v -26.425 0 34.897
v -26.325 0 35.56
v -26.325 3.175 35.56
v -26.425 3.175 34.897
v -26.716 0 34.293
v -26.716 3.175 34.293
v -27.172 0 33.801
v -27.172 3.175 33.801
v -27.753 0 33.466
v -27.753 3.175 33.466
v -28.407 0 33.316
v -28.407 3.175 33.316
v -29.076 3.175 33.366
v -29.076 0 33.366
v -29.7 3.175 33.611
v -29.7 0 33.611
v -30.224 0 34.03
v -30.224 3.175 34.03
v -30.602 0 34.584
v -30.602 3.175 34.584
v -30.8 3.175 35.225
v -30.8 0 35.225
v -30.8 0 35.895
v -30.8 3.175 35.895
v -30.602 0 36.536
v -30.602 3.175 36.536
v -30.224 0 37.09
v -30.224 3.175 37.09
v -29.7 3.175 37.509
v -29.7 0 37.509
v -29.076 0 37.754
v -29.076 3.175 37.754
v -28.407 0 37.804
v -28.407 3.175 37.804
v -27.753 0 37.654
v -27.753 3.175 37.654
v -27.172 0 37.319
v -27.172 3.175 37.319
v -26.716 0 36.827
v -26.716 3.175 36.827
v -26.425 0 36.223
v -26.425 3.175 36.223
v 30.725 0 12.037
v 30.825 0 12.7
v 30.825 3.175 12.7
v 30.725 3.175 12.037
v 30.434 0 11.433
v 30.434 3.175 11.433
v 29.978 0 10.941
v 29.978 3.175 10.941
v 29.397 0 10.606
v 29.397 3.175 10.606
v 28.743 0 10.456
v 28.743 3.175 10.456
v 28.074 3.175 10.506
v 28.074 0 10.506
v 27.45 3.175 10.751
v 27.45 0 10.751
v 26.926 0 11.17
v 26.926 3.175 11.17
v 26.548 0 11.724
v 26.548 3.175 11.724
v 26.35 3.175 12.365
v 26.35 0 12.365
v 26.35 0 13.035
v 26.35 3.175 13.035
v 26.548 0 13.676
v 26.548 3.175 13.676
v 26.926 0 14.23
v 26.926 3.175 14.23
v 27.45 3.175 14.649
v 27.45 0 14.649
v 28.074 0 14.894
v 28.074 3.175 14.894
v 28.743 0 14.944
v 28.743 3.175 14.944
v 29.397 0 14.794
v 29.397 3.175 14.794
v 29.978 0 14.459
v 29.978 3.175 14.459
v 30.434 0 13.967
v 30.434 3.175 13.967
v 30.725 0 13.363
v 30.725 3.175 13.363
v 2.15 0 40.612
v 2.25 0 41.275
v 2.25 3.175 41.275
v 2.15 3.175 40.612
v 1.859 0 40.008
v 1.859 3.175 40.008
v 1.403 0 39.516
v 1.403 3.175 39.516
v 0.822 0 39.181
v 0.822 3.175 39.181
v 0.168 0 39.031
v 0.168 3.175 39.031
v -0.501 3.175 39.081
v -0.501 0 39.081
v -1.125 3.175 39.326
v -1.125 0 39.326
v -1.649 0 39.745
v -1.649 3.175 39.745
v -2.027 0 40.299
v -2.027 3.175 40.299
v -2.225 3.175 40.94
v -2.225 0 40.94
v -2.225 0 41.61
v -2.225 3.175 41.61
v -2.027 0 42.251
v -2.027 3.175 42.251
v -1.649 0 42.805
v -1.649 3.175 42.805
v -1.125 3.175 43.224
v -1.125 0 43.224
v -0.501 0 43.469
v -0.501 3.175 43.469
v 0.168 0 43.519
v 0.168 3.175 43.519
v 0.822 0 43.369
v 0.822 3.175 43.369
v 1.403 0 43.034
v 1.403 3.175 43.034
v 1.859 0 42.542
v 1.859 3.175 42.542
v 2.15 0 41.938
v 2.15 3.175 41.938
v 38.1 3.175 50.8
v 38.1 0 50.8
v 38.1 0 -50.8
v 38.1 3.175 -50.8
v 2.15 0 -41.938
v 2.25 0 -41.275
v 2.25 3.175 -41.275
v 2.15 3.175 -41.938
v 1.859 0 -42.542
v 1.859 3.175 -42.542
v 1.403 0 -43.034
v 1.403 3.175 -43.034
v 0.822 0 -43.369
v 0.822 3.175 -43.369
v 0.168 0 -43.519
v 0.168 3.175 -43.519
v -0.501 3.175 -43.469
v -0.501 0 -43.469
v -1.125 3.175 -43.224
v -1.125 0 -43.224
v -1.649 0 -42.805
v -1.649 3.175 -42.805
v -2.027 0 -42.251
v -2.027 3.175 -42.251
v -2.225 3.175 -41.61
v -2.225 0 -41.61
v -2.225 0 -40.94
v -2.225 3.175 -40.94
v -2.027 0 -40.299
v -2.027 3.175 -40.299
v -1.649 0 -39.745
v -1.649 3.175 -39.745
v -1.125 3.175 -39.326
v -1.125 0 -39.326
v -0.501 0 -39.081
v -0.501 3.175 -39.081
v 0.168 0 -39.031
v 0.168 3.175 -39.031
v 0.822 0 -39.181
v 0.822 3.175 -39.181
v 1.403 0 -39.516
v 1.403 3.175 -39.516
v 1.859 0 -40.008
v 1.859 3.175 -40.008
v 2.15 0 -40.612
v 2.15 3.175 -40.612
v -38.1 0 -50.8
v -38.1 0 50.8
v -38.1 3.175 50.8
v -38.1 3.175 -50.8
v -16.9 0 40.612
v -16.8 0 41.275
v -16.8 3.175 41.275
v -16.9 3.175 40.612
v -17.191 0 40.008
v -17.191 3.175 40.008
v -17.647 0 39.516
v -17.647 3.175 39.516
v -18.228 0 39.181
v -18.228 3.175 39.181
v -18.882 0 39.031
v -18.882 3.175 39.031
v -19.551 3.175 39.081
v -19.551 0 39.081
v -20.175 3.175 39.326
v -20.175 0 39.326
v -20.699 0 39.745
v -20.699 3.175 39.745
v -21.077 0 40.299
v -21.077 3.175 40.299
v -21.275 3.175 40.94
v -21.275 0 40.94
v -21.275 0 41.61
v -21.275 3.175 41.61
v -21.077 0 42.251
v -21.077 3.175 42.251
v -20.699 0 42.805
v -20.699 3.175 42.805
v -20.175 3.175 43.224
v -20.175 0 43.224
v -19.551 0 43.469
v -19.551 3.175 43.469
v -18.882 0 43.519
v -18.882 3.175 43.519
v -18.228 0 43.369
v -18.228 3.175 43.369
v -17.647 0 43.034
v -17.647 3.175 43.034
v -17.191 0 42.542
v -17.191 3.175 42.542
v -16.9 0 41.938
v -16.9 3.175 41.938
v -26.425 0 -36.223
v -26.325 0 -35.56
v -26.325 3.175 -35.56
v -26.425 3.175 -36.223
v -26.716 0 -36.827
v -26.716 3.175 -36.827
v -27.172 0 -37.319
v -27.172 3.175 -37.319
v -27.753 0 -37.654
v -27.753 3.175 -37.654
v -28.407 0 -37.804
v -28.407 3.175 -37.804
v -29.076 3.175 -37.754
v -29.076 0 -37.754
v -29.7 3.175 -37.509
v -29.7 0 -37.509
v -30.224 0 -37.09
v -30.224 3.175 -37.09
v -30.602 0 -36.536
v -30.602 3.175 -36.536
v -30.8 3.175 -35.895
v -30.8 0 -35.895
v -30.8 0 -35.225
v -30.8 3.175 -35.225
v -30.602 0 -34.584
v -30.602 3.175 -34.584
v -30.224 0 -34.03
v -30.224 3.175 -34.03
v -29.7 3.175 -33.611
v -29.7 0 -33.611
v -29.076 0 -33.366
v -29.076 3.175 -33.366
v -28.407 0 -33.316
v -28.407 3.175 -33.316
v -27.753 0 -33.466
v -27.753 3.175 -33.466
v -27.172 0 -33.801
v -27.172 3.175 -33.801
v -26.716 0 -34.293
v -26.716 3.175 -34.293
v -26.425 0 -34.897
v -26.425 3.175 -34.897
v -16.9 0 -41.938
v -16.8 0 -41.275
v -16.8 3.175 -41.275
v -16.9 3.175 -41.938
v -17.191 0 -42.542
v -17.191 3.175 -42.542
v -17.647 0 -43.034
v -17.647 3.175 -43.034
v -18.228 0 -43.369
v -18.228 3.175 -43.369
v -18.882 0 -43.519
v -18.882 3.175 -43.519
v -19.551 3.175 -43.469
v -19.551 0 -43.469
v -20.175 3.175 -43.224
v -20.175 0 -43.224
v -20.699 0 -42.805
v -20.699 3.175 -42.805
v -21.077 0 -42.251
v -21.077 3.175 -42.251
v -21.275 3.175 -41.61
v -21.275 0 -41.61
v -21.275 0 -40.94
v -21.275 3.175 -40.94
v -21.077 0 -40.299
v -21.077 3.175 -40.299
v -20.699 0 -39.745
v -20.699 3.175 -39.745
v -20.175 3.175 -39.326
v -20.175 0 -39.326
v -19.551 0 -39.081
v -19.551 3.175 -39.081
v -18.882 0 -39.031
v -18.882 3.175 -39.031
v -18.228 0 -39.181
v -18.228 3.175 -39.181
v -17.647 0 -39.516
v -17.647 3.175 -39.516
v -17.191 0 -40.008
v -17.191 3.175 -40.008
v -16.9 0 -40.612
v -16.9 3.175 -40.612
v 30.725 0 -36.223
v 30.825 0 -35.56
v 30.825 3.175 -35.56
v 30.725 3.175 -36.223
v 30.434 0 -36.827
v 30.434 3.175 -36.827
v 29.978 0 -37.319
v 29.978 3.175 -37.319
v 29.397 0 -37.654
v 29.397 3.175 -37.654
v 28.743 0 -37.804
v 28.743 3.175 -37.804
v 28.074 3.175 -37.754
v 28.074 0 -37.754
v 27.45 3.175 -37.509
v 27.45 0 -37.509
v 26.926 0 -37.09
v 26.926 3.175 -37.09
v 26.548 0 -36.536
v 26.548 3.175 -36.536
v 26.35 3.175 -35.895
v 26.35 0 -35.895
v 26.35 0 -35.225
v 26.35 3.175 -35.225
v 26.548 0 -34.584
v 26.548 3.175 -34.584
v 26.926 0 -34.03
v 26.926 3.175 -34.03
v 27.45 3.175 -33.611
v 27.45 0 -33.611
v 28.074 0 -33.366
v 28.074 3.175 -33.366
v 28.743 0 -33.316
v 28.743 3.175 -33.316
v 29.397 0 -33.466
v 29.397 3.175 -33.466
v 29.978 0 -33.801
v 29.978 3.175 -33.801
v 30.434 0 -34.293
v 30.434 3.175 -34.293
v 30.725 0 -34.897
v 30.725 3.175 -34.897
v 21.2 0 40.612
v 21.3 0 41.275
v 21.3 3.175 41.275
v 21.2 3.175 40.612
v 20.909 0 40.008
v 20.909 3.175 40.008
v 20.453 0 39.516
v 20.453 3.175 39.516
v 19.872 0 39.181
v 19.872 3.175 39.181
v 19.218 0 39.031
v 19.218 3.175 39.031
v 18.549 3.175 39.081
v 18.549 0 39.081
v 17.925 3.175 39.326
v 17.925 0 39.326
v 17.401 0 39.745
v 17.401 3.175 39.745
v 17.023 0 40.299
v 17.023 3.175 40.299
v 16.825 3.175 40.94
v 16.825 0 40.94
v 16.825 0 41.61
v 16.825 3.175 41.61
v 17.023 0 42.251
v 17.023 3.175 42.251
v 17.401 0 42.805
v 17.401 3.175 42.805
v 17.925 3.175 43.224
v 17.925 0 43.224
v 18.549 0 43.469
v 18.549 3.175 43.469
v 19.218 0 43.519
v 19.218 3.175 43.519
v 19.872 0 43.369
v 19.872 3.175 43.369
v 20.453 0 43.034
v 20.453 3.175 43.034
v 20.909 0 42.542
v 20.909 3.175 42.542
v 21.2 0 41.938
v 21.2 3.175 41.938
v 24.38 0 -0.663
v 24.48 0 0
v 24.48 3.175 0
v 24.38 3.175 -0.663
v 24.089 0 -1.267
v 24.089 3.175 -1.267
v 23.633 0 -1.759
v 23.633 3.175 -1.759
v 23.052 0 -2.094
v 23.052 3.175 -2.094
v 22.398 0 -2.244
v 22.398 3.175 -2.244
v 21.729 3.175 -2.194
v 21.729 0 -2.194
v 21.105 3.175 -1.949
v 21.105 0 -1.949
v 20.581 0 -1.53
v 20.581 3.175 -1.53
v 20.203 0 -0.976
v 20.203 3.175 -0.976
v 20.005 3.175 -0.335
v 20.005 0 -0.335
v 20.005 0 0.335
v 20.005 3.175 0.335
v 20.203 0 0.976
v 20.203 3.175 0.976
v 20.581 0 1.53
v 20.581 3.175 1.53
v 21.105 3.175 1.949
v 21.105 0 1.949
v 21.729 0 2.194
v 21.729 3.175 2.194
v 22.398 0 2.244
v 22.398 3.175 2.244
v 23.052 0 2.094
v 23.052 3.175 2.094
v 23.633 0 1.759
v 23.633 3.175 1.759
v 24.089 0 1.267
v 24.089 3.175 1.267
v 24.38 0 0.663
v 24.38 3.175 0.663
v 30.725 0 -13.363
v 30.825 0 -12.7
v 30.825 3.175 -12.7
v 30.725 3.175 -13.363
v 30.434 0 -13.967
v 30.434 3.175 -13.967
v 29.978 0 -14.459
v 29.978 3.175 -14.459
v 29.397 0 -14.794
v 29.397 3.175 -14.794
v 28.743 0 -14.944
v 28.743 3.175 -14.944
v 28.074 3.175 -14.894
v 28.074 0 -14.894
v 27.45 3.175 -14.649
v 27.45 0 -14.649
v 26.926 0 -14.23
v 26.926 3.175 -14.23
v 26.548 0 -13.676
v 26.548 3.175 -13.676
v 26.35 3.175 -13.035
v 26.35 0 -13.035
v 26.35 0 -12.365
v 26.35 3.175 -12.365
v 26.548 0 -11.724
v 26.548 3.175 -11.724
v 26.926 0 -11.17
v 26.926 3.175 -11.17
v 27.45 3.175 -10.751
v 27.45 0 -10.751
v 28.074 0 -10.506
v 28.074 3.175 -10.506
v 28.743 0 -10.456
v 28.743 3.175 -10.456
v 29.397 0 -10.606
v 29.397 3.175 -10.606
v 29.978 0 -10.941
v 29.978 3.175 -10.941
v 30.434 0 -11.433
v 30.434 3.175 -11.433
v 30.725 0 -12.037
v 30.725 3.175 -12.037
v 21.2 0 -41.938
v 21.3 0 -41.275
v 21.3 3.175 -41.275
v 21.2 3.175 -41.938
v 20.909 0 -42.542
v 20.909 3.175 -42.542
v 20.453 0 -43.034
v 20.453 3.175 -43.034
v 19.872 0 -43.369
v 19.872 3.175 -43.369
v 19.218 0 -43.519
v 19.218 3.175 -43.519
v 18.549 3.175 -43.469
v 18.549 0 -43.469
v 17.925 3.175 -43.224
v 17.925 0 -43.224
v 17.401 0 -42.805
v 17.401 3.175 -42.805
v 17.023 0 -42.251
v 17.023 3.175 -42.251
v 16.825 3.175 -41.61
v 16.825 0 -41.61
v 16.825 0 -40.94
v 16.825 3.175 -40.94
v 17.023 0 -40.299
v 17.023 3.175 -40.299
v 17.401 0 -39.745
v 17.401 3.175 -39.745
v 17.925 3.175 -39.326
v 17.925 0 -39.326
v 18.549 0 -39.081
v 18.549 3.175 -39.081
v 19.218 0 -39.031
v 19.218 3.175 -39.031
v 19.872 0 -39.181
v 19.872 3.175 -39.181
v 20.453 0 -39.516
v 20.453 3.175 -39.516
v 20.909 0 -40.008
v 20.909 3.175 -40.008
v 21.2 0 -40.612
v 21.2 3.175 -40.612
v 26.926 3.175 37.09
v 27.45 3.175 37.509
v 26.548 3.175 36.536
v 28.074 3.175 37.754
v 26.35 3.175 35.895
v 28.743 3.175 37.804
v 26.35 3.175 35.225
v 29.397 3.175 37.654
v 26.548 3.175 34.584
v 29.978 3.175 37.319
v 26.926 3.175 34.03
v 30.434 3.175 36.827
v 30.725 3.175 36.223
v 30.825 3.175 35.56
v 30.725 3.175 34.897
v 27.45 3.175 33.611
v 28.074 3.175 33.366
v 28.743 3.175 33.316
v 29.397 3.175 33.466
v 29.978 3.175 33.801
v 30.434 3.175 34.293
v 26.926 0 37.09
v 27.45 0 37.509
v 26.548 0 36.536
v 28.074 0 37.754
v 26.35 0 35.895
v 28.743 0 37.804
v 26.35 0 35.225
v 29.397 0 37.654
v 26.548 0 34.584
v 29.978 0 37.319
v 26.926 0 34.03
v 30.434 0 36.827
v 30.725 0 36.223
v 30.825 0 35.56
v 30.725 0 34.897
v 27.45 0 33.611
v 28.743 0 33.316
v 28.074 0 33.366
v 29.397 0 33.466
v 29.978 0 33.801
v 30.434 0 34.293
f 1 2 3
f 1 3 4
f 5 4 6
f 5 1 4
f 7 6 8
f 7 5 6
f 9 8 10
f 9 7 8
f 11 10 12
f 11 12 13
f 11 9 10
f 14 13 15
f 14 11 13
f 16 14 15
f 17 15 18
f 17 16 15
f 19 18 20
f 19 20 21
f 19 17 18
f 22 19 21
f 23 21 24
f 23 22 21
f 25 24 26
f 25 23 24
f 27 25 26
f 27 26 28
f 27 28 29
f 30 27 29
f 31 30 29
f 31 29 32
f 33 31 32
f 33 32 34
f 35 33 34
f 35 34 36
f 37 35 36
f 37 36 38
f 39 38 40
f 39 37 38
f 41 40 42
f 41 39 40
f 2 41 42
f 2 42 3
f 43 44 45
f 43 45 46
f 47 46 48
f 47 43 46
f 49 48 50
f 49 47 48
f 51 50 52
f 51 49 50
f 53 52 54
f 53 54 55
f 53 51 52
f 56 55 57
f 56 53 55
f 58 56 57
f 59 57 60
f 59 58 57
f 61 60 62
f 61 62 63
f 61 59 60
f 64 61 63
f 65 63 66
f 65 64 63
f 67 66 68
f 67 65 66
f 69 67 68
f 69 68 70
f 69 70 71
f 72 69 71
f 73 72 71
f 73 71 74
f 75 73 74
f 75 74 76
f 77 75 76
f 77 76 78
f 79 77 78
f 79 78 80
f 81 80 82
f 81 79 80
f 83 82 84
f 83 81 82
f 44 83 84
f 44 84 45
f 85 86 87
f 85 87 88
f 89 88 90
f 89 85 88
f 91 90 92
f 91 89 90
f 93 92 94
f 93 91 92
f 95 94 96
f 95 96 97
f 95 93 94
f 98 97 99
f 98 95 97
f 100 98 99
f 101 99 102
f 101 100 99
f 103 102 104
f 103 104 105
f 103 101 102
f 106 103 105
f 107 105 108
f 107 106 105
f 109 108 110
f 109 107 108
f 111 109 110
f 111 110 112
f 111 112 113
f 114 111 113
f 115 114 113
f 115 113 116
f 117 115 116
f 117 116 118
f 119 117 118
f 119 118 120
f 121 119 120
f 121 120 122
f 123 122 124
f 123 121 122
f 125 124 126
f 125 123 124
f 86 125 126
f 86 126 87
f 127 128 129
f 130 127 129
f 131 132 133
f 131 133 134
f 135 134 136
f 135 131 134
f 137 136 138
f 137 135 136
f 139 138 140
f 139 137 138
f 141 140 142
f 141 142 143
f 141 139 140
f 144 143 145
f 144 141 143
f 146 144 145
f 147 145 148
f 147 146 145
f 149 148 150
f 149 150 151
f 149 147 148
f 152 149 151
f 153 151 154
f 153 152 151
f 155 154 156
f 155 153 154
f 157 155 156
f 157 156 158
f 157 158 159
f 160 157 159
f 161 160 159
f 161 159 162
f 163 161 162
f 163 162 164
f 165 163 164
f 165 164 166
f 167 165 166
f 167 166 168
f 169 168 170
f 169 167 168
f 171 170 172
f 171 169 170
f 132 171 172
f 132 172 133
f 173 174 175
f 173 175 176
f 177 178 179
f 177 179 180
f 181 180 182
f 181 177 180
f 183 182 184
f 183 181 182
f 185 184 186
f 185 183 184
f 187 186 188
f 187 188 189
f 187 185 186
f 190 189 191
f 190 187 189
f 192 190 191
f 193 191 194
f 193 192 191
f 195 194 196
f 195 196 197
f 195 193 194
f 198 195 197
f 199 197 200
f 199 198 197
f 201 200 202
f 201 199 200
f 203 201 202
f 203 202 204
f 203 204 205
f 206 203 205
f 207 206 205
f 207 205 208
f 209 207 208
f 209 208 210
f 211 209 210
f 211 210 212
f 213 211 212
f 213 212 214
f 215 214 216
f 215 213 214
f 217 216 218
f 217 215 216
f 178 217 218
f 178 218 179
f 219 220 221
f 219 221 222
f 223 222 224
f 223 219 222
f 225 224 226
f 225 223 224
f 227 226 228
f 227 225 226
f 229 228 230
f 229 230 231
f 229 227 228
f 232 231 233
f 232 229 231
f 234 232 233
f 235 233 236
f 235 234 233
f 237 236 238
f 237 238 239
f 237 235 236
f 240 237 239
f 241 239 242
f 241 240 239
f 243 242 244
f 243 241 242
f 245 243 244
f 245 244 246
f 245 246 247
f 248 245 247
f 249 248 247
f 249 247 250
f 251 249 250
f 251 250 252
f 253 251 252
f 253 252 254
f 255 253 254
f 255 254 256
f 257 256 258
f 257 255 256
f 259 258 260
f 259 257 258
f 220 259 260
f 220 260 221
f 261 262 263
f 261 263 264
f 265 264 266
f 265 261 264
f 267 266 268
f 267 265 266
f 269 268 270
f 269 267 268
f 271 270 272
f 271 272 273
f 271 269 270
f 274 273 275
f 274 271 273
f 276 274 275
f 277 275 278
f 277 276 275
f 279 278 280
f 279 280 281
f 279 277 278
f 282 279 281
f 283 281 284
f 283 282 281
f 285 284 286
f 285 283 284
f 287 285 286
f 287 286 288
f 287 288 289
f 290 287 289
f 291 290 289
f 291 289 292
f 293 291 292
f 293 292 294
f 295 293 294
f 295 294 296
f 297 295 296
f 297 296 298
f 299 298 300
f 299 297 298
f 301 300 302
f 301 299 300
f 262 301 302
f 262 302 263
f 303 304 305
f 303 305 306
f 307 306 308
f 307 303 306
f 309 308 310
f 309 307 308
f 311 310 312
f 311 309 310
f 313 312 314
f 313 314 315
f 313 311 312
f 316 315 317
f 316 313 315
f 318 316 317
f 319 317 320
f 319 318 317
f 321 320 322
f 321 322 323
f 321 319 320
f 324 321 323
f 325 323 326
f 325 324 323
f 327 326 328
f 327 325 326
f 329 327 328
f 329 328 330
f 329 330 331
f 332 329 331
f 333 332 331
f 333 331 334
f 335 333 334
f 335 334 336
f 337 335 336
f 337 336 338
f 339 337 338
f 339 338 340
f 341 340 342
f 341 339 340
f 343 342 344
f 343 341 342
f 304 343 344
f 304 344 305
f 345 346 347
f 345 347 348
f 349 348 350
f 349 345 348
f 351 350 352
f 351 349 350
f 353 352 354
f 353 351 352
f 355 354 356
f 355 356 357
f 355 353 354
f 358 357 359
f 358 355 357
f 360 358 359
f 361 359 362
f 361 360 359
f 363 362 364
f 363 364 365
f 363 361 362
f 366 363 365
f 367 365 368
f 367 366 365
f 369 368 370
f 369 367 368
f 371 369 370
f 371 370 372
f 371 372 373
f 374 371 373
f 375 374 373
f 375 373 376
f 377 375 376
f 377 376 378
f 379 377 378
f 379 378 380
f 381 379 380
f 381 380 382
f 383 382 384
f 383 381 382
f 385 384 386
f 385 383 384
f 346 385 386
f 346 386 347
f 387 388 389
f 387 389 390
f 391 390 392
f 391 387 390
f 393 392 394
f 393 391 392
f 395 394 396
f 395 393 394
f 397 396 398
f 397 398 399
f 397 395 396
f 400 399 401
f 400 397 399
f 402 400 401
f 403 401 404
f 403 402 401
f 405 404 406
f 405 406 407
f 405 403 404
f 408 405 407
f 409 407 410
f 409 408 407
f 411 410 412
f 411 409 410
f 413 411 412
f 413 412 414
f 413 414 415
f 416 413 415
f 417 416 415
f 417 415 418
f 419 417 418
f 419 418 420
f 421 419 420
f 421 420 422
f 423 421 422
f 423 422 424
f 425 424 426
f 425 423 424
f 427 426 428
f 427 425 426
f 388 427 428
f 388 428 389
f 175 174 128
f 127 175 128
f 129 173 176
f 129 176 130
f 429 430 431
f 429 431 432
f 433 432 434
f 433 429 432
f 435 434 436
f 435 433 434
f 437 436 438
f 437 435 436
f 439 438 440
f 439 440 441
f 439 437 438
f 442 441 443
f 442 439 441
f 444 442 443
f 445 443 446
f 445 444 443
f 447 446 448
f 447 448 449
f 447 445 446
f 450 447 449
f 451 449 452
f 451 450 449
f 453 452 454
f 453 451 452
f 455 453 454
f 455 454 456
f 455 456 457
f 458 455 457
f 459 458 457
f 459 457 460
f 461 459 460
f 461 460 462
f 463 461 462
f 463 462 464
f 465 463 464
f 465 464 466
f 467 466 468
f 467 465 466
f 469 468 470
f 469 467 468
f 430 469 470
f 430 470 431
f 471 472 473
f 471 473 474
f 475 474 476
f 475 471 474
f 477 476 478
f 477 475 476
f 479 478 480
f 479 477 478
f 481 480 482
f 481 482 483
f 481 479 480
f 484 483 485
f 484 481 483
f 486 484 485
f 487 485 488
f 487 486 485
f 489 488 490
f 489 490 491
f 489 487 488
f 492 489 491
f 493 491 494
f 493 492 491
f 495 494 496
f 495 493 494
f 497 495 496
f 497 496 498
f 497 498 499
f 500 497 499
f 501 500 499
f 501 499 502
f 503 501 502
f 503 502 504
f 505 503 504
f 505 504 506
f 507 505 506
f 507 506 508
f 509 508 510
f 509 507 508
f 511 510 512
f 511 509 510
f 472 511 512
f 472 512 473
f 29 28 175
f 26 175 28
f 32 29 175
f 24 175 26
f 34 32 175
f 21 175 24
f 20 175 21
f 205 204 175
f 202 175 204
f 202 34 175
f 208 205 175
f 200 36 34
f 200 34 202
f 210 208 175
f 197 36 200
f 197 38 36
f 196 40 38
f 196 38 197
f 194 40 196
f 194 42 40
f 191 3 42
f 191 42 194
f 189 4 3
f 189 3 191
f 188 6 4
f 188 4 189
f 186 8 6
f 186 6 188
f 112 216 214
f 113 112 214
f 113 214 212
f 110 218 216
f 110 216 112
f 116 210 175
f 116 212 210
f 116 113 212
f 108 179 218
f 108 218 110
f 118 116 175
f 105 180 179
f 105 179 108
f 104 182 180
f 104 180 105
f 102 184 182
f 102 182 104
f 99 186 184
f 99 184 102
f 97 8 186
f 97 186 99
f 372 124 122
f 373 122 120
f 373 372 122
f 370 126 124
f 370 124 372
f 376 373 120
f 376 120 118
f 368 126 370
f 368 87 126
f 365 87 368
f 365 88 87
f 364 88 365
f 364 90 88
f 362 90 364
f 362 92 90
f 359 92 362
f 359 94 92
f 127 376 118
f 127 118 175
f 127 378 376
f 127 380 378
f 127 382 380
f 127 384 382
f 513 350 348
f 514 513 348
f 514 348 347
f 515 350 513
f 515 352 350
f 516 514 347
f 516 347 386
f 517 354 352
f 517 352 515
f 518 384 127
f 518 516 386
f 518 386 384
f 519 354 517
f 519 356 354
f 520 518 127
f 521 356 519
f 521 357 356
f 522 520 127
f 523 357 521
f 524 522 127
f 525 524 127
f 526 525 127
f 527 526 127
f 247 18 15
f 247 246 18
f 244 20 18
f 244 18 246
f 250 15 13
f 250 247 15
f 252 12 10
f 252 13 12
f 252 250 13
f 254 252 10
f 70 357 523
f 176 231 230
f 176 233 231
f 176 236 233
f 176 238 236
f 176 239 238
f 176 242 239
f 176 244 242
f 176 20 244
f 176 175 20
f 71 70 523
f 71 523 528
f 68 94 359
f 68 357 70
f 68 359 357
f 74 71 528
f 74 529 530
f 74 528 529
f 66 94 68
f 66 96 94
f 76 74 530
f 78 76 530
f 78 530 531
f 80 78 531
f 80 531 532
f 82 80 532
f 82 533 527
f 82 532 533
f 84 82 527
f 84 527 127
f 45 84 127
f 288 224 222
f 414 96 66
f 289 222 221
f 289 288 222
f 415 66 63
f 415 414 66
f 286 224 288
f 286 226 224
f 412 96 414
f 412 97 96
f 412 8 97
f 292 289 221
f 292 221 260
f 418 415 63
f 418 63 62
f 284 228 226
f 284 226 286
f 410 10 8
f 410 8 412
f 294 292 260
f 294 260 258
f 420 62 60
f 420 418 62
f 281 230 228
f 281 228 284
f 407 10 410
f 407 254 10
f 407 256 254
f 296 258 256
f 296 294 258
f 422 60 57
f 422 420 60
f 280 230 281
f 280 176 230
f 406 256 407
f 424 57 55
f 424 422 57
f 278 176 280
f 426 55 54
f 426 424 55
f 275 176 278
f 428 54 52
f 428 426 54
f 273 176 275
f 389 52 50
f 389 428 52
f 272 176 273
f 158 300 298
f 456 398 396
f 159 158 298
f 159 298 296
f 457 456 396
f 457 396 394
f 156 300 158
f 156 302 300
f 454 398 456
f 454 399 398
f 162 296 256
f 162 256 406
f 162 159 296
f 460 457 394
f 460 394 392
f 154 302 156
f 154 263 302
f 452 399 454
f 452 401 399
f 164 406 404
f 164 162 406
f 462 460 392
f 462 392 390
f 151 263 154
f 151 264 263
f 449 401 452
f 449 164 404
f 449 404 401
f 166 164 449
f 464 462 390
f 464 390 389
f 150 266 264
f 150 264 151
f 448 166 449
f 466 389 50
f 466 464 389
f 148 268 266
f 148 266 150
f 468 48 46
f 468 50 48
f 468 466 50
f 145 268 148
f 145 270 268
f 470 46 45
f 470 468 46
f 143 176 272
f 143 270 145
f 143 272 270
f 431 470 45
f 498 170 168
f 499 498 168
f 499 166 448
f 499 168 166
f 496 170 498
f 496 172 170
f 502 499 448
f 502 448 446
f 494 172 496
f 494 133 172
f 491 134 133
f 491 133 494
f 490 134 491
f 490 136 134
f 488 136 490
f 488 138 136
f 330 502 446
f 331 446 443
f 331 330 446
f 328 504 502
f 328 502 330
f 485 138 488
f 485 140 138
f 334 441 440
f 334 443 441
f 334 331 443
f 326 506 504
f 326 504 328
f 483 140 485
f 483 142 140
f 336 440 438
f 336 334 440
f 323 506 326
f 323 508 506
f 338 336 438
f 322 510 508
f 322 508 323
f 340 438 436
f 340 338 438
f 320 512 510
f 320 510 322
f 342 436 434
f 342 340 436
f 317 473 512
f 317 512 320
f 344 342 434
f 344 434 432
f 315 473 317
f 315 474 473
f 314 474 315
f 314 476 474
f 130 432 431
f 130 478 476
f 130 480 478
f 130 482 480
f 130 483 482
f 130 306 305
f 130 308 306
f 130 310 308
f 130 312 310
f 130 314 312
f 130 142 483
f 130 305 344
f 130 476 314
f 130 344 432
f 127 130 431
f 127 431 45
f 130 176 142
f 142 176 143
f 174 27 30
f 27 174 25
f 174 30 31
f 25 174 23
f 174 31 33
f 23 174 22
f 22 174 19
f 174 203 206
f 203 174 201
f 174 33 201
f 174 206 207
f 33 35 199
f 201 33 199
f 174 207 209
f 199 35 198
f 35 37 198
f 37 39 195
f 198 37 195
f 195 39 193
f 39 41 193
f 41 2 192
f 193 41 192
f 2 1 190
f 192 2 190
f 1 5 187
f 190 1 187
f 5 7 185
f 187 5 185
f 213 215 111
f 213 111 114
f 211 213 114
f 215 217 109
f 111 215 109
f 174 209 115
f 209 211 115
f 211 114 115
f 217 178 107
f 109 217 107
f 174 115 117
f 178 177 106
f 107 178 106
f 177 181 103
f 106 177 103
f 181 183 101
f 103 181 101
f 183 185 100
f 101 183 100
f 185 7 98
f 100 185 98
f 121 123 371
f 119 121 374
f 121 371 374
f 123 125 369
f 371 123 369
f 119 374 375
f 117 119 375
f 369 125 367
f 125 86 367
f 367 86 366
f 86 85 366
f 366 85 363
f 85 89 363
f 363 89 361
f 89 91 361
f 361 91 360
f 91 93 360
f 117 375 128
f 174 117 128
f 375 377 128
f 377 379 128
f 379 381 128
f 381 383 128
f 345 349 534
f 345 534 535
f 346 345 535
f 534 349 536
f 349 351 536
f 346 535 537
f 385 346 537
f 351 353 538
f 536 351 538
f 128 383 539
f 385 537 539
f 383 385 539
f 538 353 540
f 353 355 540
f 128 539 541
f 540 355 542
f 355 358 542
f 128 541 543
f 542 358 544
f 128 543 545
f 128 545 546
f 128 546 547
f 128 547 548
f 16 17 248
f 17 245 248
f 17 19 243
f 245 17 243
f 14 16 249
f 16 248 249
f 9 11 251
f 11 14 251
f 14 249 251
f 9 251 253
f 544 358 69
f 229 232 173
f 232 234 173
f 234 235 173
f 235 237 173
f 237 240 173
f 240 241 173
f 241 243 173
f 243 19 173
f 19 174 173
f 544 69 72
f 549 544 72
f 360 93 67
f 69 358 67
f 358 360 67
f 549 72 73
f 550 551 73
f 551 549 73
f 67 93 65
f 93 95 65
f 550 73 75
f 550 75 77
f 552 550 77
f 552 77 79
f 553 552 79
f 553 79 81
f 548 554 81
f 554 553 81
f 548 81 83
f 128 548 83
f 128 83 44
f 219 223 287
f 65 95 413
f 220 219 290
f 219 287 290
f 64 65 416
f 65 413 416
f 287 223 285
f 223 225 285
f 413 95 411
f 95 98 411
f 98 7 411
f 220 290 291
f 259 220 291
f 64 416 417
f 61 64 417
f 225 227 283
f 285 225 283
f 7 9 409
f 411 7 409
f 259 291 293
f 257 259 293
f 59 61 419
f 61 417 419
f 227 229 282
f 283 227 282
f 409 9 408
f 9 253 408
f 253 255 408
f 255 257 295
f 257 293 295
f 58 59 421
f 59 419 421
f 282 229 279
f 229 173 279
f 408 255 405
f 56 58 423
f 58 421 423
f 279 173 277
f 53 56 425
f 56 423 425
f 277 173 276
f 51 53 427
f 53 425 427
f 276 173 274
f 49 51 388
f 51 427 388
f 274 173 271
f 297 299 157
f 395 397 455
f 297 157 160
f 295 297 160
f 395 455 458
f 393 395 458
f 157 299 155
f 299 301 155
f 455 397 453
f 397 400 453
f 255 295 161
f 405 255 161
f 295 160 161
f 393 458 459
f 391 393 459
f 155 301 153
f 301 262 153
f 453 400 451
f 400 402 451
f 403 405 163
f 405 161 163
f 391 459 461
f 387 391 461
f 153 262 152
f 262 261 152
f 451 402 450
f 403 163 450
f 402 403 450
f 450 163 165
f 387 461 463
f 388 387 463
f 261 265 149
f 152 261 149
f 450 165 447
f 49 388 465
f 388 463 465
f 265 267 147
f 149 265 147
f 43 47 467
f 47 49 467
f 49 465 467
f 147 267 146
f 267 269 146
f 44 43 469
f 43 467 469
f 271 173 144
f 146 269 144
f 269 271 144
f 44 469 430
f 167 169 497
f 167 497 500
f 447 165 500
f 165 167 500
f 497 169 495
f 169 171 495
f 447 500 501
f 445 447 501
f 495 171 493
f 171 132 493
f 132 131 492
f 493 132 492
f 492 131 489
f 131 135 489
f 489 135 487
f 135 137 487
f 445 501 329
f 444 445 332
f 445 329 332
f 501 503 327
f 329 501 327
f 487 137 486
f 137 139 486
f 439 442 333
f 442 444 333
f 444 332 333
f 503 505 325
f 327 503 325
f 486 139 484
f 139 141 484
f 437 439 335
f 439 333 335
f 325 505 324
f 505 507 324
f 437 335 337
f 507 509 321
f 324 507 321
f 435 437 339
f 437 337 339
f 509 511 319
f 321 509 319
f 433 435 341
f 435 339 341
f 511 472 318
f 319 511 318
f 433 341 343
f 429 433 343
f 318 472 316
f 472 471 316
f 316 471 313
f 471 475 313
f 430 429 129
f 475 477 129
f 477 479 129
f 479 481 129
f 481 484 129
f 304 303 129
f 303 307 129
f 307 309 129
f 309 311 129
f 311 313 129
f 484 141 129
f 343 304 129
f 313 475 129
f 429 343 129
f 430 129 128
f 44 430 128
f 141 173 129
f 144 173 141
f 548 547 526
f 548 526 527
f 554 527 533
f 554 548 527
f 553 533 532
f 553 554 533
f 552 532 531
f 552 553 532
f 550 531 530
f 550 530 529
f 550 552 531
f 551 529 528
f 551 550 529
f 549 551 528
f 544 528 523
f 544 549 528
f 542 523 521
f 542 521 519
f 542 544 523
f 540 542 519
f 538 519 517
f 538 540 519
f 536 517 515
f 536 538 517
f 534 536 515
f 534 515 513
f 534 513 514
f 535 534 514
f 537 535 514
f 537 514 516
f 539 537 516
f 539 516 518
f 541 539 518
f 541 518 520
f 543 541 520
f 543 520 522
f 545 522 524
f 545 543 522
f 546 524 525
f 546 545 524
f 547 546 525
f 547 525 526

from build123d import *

# Parameters (mm, degrees)
SKETCH1_W           = 76.2
SKETCH1_H           = 101.6
SKETCH1_R           = 2.25
BOSS_EXTRUDE1_DEPTH = 3.175


with BuildPart() as part:
    # Sketch1 → Boss-Extrude1 (new body)
    with BuildSketch(Plane(origin=(0, 0, 0), x_dir=(1, 0, 0), z_dir=(0, 1, 0))):
        Rectangle(SKETCH1_W, SKETCH1_H)
        with Locations((-19.05, -41.275)):
            Circle(SKETCH1_R, mode=Mode.SUBTRACT)
        with Locations((19.05, -41.275)):
            Circle(SKETCH1_R, mode=Mode.SUBTRACT)
        with Locations((28.575, -35.56)):
            Circle(SKETCH1_R, mode=Mode.SUBTRACT)
        with Locations((-28.575, -35.56)):
            Circle(SKETCH1_R, mode=Mode.SUBTRACT)
        with Locations((28.575, 35.56)):
            Circle(SKETCH1_R, mode=Mode.SUBTRACT)
        with Locations((19.05, 41.275)):
            Circle(SKETCH1_R, mode=Mode.SUBTRACT)
        with Locations((-28.575, 35.56)):
            Circle(SKETCH1_R, mode=Mode.SUBTRACT)
        with Locations((-19.05, 41.275)):
            Circle(SKETCH1_R, mode=Mode.SUBTRACT)
        with Locations((0, -41.275)):
            Circle(SKETCH1_R, mode=Mode.SUBTRACT)
        with Locations((0, 41.275)):
            Circle(SKETCH1_R, mode=Mode.SUBTRACT)
        with Locations((28.575, 12.7)):
            Circle(SKETCH1_R, mode=Mode.SUBTRACT)
        with Locations((28.575, -12.7)):
            Circle(SKETCH1_R, mode=Mode.SUBTRACT)
        with Locations((22.23, 0)):
            Circle(SKETCH1_R, mode=Mode.SUBTRACT)
    extrude(amount=BOSS_EXTRUDE1_DEPTH)


solid = part.part
